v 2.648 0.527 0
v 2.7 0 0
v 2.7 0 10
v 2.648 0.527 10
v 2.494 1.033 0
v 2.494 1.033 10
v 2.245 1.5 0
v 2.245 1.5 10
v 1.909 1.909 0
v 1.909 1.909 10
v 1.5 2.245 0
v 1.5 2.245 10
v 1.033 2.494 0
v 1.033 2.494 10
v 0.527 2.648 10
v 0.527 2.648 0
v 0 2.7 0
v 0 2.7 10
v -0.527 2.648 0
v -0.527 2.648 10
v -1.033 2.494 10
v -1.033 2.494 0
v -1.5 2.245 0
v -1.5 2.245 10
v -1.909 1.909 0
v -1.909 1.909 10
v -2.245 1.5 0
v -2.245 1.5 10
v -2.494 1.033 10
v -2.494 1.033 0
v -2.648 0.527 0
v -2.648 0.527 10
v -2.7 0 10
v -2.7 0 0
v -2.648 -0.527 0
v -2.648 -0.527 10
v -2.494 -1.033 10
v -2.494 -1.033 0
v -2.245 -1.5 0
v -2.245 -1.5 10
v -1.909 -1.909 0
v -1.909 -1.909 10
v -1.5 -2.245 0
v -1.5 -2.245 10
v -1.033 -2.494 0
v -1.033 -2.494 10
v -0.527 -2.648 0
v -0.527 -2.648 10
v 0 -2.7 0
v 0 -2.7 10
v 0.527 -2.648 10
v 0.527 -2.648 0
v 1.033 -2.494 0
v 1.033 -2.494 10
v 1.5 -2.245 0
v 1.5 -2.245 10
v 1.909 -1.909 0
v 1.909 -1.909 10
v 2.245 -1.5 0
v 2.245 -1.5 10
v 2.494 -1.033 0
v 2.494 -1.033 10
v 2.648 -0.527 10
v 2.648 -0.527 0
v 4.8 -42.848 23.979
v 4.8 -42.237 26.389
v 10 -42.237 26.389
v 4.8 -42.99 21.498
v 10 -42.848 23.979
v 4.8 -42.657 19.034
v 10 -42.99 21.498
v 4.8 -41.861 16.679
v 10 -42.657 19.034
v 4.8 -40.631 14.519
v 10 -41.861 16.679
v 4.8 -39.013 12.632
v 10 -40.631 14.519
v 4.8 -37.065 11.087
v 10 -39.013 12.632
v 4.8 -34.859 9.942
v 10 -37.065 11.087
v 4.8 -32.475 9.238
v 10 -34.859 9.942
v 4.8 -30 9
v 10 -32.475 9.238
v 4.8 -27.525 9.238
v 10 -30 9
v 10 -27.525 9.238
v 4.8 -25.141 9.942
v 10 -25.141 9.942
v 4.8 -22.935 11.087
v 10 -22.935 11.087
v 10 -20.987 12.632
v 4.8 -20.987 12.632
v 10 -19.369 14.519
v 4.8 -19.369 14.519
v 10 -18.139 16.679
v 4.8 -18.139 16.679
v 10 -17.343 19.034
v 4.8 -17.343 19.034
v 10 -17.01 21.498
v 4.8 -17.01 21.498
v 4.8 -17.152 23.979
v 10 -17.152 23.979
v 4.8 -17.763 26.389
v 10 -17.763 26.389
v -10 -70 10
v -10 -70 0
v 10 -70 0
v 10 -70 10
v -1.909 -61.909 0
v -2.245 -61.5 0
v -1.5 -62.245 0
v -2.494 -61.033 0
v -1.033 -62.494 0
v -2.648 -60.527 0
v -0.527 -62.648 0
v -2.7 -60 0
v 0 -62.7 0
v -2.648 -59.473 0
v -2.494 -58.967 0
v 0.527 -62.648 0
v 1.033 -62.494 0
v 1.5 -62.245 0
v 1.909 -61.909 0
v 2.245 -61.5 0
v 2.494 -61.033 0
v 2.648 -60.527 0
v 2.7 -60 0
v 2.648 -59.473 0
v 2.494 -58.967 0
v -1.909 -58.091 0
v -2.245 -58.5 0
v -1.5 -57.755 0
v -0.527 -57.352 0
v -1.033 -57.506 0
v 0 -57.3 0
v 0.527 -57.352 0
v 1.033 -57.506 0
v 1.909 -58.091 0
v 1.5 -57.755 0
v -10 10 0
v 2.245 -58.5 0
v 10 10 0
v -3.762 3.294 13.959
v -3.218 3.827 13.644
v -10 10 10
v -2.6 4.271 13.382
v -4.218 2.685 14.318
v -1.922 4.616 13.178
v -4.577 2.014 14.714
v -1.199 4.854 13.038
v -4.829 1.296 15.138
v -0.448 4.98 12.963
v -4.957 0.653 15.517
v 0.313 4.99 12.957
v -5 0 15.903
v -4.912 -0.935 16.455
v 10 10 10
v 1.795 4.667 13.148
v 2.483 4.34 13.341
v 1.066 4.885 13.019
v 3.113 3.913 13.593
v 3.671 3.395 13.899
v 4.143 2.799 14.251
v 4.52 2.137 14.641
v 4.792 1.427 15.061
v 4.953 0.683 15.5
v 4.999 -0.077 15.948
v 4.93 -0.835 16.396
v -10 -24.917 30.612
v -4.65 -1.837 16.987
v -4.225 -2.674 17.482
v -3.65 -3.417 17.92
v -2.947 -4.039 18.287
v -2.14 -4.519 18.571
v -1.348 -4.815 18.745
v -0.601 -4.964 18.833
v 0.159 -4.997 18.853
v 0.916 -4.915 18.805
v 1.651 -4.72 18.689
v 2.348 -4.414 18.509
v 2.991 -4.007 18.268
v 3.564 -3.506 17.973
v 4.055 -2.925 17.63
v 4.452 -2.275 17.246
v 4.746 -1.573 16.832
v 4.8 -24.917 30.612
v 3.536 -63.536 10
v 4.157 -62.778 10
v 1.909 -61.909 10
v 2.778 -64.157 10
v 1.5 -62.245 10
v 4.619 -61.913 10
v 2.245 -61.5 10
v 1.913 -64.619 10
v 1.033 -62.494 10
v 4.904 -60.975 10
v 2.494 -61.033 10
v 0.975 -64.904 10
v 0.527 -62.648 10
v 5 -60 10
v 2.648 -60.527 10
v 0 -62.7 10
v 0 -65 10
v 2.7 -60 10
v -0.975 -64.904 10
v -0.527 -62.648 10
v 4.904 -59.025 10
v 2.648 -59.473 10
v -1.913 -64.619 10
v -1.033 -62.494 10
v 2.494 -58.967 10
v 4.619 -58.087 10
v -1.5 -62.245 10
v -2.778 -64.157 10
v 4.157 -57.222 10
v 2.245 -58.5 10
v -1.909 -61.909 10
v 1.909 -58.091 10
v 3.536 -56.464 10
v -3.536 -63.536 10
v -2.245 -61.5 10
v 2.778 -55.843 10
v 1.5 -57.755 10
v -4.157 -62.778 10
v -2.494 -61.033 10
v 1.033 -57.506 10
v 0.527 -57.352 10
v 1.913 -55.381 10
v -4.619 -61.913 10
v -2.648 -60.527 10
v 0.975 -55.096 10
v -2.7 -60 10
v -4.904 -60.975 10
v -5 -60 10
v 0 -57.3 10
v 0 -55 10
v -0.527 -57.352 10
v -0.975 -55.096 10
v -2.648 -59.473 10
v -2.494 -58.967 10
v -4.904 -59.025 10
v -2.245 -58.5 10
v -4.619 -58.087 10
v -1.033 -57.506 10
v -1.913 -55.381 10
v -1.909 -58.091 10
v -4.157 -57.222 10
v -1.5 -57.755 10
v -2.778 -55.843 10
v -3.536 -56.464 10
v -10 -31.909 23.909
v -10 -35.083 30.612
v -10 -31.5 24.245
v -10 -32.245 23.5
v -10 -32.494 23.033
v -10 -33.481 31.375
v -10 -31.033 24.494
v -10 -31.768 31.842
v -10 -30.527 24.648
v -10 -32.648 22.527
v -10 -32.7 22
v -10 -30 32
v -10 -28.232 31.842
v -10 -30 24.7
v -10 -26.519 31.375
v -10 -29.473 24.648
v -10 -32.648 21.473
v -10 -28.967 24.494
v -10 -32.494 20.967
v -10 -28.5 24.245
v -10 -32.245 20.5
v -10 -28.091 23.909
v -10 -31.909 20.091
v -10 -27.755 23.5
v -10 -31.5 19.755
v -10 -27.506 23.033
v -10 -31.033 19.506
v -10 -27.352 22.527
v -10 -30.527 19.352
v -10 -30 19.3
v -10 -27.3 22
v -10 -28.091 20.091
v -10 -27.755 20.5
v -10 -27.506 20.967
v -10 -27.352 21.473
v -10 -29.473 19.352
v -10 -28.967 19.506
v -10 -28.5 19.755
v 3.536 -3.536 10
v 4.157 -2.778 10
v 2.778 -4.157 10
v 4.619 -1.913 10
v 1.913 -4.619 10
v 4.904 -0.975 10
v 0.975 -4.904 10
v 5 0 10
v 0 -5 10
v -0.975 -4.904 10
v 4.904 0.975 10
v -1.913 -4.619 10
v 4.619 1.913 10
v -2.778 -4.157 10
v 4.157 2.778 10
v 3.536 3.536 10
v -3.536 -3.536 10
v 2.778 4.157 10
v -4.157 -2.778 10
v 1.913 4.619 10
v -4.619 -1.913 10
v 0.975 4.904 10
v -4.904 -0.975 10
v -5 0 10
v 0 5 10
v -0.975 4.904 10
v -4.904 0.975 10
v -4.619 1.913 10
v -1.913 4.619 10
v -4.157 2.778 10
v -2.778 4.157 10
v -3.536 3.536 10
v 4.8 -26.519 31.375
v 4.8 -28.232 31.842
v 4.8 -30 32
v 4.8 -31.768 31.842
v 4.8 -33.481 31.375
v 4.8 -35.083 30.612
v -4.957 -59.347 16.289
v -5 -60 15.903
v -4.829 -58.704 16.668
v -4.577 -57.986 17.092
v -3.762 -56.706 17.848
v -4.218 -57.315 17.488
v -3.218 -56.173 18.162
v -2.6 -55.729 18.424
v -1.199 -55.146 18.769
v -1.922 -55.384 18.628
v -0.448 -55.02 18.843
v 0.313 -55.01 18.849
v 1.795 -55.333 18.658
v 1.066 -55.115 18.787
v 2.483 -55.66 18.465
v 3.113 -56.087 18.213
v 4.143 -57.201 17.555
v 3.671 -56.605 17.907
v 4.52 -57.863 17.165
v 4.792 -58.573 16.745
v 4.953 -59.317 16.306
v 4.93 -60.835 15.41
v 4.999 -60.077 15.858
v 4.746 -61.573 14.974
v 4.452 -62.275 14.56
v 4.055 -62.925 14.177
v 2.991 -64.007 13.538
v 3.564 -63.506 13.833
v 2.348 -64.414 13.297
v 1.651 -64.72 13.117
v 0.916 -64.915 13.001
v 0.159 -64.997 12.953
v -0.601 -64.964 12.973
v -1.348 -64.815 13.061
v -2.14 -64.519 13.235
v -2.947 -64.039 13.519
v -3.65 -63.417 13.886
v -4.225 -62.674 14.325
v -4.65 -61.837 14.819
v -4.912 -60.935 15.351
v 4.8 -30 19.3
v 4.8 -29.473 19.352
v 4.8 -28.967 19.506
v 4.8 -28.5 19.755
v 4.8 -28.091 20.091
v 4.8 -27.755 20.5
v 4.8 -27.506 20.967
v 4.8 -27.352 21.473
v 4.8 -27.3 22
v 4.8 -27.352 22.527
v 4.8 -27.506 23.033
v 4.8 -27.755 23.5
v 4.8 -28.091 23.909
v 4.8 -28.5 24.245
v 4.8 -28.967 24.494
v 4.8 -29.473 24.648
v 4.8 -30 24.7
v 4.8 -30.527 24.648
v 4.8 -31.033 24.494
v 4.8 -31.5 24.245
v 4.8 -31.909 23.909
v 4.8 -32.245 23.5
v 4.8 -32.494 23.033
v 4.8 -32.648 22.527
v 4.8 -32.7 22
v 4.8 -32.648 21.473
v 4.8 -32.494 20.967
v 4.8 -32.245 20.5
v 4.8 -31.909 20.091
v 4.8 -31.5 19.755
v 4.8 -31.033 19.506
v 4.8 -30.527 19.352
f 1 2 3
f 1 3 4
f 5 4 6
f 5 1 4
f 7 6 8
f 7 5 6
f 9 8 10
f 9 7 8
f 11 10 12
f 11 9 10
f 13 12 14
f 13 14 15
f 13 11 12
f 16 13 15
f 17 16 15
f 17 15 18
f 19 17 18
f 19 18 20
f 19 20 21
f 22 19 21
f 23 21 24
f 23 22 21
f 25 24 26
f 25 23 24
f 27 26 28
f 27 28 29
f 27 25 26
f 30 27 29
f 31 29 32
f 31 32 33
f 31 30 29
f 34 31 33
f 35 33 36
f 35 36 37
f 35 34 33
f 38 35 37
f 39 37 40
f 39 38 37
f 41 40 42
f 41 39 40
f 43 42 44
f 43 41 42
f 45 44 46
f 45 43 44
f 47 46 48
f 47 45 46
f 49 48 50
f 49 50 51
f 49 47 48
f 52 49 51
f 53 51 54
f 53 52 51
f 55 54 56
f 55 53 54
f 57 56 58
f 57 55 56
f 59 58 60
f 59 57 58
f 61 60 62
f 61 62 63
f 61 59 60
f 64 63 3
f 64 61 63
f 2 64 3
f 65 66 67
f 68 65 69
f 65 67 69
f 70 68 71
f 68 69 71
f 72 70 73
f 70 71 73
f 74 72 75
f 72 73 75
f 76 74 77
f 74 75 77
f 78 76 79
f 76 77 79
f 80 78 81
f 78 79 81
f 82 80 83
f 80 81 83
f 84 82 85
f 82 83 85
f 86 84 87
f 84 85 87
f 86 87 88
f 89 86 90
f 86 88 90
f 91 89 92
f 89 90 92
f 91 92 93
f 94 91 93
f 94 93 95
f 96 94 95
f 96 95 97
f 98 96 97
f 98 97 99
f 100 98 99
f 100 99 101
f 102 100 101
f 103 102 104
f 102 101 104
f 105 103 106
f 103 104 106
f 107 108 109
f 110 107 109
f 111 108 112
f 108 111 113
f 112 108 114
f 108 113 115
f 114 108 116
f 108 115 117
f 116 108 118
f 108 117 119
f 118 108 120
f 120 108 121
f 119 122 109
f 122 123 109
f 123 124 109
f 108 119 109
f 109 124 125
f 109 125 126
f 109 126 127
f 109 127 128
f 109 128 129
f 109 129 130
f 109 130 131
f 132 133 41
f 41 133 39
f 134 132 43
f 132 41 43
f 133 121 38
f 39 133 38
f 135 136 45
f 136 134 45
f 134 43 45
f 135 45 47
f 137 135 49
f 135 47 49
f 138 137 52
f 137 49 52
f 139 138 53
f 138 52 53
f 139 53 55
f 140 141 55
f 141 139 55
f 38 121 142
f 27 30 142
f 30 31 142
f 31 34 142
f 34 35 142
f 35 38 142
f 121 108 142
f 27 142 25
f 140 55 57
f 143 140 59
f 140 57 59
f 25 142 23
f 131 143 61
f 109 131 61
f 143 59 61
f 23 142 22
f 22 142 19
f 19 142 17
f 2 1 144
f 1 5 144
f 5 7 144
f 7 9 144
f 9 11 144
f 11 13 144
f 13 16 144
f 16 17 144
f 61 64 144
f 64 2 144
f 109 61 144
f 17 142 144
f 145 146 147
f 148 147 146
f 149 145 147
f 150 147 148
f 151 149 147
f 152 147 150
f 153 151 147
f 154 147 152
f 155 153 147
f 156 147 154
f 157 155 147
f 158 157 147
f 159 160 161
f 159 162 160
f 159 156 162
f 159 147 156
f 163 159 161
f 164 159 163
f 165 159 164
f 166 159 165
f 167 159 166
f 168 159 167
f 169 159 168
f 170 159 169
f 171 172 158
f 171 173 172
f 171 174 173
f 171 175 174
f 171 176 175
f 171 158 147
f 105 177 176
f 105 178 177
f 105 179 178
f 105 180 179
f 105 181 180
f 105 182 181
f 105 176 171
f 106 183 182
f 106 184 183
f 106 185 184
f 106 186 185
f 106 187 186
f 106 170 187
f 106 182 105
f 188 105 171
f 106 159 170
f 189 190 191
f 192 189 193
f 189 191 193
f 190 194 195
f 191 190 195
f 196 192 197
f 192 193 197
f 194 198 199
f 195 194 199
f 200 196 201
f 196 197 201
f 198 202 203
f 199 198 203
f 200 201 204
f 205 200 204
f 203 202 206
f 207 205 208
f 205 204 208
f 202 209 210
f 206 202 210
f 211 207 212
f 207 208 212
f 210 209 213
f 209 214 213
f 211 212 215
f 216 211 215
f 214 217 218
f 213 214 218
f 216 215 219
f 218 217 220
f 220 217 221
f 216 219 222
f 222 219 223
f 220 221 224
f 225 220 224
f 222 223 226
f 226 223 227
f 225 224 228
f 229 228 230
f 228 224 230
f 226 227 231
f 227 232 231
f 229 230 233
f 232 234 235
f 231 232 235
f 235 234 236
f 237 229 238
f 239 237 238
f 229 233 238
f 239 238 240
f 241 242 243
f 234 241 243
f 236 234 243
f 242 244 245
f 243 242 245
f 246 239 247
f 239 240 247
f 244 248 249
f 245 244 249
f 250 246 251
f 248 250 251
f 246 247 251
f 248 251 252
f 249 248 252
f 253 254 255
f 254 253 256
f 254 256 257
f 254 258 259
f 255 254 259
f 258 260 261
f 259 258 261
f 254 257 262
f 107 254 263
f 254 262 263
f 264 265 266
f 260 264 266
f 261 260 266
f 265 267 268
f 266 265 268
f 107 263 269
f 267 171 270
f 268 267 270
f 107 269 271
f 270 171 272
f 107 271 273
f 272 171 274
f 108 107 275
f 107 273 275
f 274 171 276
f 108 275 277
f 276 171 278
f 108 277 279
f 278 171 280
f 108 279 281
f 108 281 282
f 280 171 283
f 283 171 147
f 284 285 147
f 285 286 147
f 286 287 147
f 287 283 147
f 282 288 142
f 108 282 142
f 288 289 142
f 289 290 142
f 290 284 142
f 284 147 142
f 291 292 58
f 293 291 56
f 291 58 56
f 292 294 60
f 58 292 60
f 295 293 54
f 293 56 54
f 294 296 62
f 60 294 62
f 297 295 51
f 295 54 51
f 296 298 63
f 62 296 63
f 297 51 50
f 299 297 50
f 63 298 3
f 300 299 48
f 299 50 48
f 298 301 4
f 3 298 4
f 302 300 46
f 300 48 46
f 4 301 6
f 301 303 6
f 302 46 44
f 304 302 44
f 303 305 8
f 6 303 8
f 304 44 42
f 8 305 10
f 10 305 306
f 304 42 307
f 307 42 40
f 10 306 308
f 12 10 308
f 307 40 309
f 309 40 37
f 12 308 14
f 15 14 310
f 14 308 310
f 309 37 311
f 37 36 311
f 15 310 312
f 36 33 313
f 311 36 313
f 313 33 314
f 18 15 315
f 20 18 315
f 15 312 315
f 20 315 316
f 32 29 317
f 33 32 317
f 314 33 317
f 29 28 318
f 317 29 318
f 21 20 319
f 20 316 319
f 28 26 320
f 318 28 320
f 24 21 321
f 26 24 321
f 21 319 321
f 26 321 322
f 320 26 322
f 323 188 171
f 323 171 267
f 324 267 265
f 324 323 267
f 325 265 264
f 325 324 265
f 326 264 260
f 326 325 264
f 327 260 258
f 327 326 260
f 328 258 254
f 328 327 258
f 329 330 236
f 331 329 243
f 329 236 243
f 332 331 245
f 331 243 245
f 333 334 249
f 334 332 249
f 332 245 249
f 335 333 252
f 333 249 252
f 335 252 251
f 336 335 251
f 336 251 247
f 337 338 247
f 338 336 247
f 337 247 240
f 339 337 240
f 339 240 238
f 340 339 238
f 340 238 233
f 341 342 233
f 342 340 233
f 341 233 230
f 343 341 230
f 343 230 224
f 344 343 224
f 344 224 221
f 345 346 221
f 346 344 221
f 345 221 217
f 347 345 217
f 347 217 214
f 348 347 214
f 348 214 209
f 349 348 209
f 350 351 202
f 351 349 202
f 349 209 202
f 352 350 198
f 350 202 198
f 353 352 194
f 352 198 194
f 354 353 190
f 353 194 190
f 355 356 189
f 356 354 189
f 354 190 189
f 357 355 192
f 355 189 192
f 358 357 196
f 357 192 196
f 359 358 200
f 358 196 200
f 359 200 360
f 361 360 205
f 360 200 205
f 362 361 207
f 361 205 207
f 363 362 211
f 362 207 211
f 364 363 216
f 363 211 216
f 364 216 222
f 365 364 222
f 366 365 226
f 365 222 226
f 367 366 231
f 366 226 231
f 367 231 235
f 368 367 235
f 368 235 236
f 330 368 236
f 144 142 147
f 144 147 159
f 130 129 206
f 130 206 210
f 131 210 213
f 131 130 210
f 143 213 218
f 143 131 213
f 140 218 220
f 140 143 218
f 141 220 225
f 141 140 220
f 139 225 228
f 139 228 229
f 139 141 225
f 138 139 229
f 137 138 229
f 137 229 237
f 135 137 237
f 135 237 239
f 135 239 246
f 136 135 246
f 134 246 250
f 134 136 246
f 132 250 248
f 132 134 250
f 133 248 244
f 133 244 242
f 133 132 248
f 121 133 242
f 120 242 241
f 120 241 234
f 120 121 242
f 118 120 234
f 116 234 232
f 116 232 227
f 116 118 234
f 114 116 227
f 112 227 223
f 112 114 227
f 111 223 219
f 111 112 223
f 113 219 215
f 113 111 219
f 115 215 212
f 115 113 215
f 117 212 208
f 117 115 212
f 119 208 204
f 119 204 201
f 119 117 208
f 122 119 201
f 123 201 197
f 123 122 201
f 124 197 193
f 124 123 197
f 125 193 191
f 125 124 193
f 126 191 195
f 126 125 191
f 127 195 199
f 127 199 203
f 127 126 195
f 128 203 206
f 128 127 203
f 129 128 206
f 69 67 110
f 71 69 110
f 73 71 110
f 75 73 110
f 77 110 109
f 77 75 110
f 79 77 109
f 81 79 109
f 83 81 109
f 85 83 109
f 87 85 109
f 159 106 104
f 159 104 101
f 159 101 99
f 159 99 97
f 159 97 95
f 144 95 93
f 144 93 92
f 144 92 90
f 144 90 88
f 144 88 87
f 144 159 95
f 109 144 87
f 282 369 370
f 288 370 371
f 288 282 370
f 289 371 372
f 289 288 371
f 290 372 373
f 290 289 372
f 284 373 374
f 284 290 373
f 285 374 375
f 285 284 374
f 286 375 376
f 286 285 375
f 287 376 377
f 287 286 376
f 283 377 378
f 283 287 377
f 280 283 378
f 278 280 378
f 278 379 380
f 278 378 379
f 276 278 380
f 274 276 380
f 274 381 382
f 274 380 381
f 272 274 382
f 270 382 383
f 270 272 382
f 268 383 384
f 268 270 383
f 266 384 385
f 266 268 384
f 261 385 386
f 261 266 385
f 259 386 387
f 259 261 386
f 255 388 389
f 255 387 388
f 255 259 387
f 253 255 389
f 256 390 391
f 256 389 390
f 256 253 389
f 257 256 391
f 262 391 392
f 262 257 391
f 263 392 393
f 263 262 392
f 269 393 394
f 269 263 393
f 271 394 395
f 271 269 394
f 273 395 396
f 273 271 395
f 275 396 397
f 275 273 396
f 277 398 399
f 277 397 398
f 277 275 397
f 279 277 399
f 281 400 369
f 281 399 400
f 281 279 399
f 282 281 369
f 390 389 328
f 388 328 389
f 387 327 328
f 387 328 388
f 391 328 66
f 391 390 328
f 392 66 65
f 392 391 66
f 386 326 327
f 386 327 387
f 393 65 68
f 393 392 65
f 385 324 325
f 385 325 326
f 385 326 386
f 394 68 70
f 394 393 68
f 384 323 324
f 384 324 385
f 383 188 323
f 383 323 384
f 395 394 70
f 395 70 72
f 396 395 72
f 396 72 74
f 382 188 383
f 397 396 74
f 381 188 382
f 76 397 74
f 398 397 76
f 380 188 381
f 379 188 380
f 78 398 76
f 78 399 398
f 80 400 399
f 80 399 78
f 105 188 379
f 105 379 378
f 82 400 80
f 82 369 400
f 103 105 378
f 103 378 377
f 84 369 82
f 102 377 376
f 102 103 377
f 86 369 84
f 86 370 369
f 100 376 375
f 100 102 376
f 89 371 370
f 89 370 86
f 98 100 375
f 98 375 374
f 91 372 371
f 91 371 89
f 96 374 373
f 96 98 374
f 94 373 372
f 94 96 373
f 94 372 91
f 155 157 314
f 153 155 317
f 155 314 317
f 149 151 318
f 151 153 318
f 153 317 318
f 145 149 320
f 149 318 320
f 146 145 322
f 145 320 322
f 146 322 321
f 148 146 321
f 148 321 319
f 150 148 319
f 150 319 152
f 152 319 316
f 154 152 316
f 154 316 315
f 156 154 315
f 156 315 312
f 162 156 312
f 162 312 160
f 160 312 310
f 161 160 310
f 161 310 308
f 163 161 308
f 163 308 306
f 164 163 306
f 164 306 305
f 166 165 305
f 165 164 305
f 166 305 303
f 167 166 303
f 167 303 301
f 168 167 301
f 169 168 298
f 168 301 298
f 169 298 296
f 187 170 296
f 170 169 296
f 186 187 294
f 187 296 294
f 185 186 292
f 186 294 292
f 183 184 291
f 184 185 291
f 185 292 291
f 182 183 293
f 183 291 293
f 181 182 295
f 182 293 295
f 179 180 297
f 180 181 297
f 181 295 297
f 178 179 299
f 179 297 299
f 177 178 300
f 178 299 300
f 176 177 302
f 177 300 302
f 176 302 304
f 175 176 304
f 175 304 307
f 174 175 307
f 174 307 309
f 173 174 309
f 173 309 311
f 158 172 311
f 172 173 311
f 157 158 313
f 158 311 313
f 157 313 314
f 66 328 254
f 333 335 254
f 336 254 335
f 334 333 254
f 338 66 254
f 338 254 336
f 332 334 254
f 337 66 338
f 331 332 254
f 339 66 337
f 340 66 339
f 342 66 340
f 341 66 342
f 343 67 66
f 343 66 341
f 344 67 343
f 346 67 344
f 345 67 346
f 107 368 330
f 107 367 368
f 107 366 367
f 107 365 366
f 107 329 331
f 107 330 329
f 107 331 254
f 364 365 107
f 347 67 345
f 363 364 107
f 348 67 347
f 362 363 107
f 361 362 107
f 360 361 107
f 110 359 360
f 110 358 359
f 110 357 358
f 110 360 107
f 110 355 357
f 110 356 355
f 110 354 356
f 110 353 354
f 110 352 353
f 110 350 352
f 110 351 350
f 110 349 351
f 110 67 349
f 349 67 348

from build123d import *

# Parameters (mm, degrees)
SKETCH1_W           = 20
SKETCH1_H           = 80
SKETCH1_R           = 2.7
BOSS_EXTRUDE1_DEPTH = 10
SKETCH2_R           = 2.7
BOSS_EXTRUDE2_DEPTH = 10
SKETCH3_R           = 5
CUT_EXTRUDE1_DEPTH  = 23
SKETCH4_R           = 13
CUT_EXTRUDE2_DEPTH  = 5.2


with BuildPart() as part:
    # Sketch1 → Boss-Extrude1 (new body)
    with BuildSketch(Plane.XY):
        with Locations((0, -30)):
            Rectangle(SKETCH1_W, SKETCH1_H)
        Circle(SKETCH1_R, mode=Mode.SUBTRACT)
        with Locations((0, -60)):
            Circle(SKETCH1_R, mode=Mode.SUBTRACT)
    extrude(amount=BOSS_EXTRUDE1_DEPTH)

    # Sketch2 → Boss-Extrude2 (add, symmetric)
    with BuildSketch(Plane(origin=(0, 0, 0), x_dir=(0, 0, -1), z_dir=(1, 0, 0))):
        with BuildLine():
            Line((-10, 10), (-30.611529786, -24.916541064))
            ThreePointArc((-30.611529786, -24.916541064), (-32, -30), (-30.611529786, -35.083458936))
            Line((-30.611529786, -35.083458936), (-10, -70))
            Line((-10, -70), (-10, 10))
        make_face()
        with Locations((-22, -30)):
            Circle(SKETCH2_R, mode=Mode.SUBTRACT)
    extrude(amount=BOSS_EXTRUDE2_DEPTH, both=True)

    # Sketch3 → Cut-Extrude1 (cut, through all)
    with BuildSketch(Plane(origin=(0, 0, 10), x_dir=(-1, 0, 0), z_dir=(0, 0, -1))):
        with Locations((0, -60)):
            Circle(SKETCH3_R)
        Circle(SKETCH3_R)
    extrude(amount=-CUT_EXTRUDE1_DEPTH, mode=Mode.SUBTRACT)

    # Sketch4 → Cut-Extrude2 (cut)
    with BuildSketch(Plane(origin=(10, 0, 0), x_dir=(0, 0, -1), z_dir=(1, 0, 0))):
        with Locations((-22, -30)):
            Circle(SKETCH4_R)
    extrude(amount=-CUT_EXTRUDE2_DEPTH, mode=Mode.SUBTRACT)


solid = part.part
